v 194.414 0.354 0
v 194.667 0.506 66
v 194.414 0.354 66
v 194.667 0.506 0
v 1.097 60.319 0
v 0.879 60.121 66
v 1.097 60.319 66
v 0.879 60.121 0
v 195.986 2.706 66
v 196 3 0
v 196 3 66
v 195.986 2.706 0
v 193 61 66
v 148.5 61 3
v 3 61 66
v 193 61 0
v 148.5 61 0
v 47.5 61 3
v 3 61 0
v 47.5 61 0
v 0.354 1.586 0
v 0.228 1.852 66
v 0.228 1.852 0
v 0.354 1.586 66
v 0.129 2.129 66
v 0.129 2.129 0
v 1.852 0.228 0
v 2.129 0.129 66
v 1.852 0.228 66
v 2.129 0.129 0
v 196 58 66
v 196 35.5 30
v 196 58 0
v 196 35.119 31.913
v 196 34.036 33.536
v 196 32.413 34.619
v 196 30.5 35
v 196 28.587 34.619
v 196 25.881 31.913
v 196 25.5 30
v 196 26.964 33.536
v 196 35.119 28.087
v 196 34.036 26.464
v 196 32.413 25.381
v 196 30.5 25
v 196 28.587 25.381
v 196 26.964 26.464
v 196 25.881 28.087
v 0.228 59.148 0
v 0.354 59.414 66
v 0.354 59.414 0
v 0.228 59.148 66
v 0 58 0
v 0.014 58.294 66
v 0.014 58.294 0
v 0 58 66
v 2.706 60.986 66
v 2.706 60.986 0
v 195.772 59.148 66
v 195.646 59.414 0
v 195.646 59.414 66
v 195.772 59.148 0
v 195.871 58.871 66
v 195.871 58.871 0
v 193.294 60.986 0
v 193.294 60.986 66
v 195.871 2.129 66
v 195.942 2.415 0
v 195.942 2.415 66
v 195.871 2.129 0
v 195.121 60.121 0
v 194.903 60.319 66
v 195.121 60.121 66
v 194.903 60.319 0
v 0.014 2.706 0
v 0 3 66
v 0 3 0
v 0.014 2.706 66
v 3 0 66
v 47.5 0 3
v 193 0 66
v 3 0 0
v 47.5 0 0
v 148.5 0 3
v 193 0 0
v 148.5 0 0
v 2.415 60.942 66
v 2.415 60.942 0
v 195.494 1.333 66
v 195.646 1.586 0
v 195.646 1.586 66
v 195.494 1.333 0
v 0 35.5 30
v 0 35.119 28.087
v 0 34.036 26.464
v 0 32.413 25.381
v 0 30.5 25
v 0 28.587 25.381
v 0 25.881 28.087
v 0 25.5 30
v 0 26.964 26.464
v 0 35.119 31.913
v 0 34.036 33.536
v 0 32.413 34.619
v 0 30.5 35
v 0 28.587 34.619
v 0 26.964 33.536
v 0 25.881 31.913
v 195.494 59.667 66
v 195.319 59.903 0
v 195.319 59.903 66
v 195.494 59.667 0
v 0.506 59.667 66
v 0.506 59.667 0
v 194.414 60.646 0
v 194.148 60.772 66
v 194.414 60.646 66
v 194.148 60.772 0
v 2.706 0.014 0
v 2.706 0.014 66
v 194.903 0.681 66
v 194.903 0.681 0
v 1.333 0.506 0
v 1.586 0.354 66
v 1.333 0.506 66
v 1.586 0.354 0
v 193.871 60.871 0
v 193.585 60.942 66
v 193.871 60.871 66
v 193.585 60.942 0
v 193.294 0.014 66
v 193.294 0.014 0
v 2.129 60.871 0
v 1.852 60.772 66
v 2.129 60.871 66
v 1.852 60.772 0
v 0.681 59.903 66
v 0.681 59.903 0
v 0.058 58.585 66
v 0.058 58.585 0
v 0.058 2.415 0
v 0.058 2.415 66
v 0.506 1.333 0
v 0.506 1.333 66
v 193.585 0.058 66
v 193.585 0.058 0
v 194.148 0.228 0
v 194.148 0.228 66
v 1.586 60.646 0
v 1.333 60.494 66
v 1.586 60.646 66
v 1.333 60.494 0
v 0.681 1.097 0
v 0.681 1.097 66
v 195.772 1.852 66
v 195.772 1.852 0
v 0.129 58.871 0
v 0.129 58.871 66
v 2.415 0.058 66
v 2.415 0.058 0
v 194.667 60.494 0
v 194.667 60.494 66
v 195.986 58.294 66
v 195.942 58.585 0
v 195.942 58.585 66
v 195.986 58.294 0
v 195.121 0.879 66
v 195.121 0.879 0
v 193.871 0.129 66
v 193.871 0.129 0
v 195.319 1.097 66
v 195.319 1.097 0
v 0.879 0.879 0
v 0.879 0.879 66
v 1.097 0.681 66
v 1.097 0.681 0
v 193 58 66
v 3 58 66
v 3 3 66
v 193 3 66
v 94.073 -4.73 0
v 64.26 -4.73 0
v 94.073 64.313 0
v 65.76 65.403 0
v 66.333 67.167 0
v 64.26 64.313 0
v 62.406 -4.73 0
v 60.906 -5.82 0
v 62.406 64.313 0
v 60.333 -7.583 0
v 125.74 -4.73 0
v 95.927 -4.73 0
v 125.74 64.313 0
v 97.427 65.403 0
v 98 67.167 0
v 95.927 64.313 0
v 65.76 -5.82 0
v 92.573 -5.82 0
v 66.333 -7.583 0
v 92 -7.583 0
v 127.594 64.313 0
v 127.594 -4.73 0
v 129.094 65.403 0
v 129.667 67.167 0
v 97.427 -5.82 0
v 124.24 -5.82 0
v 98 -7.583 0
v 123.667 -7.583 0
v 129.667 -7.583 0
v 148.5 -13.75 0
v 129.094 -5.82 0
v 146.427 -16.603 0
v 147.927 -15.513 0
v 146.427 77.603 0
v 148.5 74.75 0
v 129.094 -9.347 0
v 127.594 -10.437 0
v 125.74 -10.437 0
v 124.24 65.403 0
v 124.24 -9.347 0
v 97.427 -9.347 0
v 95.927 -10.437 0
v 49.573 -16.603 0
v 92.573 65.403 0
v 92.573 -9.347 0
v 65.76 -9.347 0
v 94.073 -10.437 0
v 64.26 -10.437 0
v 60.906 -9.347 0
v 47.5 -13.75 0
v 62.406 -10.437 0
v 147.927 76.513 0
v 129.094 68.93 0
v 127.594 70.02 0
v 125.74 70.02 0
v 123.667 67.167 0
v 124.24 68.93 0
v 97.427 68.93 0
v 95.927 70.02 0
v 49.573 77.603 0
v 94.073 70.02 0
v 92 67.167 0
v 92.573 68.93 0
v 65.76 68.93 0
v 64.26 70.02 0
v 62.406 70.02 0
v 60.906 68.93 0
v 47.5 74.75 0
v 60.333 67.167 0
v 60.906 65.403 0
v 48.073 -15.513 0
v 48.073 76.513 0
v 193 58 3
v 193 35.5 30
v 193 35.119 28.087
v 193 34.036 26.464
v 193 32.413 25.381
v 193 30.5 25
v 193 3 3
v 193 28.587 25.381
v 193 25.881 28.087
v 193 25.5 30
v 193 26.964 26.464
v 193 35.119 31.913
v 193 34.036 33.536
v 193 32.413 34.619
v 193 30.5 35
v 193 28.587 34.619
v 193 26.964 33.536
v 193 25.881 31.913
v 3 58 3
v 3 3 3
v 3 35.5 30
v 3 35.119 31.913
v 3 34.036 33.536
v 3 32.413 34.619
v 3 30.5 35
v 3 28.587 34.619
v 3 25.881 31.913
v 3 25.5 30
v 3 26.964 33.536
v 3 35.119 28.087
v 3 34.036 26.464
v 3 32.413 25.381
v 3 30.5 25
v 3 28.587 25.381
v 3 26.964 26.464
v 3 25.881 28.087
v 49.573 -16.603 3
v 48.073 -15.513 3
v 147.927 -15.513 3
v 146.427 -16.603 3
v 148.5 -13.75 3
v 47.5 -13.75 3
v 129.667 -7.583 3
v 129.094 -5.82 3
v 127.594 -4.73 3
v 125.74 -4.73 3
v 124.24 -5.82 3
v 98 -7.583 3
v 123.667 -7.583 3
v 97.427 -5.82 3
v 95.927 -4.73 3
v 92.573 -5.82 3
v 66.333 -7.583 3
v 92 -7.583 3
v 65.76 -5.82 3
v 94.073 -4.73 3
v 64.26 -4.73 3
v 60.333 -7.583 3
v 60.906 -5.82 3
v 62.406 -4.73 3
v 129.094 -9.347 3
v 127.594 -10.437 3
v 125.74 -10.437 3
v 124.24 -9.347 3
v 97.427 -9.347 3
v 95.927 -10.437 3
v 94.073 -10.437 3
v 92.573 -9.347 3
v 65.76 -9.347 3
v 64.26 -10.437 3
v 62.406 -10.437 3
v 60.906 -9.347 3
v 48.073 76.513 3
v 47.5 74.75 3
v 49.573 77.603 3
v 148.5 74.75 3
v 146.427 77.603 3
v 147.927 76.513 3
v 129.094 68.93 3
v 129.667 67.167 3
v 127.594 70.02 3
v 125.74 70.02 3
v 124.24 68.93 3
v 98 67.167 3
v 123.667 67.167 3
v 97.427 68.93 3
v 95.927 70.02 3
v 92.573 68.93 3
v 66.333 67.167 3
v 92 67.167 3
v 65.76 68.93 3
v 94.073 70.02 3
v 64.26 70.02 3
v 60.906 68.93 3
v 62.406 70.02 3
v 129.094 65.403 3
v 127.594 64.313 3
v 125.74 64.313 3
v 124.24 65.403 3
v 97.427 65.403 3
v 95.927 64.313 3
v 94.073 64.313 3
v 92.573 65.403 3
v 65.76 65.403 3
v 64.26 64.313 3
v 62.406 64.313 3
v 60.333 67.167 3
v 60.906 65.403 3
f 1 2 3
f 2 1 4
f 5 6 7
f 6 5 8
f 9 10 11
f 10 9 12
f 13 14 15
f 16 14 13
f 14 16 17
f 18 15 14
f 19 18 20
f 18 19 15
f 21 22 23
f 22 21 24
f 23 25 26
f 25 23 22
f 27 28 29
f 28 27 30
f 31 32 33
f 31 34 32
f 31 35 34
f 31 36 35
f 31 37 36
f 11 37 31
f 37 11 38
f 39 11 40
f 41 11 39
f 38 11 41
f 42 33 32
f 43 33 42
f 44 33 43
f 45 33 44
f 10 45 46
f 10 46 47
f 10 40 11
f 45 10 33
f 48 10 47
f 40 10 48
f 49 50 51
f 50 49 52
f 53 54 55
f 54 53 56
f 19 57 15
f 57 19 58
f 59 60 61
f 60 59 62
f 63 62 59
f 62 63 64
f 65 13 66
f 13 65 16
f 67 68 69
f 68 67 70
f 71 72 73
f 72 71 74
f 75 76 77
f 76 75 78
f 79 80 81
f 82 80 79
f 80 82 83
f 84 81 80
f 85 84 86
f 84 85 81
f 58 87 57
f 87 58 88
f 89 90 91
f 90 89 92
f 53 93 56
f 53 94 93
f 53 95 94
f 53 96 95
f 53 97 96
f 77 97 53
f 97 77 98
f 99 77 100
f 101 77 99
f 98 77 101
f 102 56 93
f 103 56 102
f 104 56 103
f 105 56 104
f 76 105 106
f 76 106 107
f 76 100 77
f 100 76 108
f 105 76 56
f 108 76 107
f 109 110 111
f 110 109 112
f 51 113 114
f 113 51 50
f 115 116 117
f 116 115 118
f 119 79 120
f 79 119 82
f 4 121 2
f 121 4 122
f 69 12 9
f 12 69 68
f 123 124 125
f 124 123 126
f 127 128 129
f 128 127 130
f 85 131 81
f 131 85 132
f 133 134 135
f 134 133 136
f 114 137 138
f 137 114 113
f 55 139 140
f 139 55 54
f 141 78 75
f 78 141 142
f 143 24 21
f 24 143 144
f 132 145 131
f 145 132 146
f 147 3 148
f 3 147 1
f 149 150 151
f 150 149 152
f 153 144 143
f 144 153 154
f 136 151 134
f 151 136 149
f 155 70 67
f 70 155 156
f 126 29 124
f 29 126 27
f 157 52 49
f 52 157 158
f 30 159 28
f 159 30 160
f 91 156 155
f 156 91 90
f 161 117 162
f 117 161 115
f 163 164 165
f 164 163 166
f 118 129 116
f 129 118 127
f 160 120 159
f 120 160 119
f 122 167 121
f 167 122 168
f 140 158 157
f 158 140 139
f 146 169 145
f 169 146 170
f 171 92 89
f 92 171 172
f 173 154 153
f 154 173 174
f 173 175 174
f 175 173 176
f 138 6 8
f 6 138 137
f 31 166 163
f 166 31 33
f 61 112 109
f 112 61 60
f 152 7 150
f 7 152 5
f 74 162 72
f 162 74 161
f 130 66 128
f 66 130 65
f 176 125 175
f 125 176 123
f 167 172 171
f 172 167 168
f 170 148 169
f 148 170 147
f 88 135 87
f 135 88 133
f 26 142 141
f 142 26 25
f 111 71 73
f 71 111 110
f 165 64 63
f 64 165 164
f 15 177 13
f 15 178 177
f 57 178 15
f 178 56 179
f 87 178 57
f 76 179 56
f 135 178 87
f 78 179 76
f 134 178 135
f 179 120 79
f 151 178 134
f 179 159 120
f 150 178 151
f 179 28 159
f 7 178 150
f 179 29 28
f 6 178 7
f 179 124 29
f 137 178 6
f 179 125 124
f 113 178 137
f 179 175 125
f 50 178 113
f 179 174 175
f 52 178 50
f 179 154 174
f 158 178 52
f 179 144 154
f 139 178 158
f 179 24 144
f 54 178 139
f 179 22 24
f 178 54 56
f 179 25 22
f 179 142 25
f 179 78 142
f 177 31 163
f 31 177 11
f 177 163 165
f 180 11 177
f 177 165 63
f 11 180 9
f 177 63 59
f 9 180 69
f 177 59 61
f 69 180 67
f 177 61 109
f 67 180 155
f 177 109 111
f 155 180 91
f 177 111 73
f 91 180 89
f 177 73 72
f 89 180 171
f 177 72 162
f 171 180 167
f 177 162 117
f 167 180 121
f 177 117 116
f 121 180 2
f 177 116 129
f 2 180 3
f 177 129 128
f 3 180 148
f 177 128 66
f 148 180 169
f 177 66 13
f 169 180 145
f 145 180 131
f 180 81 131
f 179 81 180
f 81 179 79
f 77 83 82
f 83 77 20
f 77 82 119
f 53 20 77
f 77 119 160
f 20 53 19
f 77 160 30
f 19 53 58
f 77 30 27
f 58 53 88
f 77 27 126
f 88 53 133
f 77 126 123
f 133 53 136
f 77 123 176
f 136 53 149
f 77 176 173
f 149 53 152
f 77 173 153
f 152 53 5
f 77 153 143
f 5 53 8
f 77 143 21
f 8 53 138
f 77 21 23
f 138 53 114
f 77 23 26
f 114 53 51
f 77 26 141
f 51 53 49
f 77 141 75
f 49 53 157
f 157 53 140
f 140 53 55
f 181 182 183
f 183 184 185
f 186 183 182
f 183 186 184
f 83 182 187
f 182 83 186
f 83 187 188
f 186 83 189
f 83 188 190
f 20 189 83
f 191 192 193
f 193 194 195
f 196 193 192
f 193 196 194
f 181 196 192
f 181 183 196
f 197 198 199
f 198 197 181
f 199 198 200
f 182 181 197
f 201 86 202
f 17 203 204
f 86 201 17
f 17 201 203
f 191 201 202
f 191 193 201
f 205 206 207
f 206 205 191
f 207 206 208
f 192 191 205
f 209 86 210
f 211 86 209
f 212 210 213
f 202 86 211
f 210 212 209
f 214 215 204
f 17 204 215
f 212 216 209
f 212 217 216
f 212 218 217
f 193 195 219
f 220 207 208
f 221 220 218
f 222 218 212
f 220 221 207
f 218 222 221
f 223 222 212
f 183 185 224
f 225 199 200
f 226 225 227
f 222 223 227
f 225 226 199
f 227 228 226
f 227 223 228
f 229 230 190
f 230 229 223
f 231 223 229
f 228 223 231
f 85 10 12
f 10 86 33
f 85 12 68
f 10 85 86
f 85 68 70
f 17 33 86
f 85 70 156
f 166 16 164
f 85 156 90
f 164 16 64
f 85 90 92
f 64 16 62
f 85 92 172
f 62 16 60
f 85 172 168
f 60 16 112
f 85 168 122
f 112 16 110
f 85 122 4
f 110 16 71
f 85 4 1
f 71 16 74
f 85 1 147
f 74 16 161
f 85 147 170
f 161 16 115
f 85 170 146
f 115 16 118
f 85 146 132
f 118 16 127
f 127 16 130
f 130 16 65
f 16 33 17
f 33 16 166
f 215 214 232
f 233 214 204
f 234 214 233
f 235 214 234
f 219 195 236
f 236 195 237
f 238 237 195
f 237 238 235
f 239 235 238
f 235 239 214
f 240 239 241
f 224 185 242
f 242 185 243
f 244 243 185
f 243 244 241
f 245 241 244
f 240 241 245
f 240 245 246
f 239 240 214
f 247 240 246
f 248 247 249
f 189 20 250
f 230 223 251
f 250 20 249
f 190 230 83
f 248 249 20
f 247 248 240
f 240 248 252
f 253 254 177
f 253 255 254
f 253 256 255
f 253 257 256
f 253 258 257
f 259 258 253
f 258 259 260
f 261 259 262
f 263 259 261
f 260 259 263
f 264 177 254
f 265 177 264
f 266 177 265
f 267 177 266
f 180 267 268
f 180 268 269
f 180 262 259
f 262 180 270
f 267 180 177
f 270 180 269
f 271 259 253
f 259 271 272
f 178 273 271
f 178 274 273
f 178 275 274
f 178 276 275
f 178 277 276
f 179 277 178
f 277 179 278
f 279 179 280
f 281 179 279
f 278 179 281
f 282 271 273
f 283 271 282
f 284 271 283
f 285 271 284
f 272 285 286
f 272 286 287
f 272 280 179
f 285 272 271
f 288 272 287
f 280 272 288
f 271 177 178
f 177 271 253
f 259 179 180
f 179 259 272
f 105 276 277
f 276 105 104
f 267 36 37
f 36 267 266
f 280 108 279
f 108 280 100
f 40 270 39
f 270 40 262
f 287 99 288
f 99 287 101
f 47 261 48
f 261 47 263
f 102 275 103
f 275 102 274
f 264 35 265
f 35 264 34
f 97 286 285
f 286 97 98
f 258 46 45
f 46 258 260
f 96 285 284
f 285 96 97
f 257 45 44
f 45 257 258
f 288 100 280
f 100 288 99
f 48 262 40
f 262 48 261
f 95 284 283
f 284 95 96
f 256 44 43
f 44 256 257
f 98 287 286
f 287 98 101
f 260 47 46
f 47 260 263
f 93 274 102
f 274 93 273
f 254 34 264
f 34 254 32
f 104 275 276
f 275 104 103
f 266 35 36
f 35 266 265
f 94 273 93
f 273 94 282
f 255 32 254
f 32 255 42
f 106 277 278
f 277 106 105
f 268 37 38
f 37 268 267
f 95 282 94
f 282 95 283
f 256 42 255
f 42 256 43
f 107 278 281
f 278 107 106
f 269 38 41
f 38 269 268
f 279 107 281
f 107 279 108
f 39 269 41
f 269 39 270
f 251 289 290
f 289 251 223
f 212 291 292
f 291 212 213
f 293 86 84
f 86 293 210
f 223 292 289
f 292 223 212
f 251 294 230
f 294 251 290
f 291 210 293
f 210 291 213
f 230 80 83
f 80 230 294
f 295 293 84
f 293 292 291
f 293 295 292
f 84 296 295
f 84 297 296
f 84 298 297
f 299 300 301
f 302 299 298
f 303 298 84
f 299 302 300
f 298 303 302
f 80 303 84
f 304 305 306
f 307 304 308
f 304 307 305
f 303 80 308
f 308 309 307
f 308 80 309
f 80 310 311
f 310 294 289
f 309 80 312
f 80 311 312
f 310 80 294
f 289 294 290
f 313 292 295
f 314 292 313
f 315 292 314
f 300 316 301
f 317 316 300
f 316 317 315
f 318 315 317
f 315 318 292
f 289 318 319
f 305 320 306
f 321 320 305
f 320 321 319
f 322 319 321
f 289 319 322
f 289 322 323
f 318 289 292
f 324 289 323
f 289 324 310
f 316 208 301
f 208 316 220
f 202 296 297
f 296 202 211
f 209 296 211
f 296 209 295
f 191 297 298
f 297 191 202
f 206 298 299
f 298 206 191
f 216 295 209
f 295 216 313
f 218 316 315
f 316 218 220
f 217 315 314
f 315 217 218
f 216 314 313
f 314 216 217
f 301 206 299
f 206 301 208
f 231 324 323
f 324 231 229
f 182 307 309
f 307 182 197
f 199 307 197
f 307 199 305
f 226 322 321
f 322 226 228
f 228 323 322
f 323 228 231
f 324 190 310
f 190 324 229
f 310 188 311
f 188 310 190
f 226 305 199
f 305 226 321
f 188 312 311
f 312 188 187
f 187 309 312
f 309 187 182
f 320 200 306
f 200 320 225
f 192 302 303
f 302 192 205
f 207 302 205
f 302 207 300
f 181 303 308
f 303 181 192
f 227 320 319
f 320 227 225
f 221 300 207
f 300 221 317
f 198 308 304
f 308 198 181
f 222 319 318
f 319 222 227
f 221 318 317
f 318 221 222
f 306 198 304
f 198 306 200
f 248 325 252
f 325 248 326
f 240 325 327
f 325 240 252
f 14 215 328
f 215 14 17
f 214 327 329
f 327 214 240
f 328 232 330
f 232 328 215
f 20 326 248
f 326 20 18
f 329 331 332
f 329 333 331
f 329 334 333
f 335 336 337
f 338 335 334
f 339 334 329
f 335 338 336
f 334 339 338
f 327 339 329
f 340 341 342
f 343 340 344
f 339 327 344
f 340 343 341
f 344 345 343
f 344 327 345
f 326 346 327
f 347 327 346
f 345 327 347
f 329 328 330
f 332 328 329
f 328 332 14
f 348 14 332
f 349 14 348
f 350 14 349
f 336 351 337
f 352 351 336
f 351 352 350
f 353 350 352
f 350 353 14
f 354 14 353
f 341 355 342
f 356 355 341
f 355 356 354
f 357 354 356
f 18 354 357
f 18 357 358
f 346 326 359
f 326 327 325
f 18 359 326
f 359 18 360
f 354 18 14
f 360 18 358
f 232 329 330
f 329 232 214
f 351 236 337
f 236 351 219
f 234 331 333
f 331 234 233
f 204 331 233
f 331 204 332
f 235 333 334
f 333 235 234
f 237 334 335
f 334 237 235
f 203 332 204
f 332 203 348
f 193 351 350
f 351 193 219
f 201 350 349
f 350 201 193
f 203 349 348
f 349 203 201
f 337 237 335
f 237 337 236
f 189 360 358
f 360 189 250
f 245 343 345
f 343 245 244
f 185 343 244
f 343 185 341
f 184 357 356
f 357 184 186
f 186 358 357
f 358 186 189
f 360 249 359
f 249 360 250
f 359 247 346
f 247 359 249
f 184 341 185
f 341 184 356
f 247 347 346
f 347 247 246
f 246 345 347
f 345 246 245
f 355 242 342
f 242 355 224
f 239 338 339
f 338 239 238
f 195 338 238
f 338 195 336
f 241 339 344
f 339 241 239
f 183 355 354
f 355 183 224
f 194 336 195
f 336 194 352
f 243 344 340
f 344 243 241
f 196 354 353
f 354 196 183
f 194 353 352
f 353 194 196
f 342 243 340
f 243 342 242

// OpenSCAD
module box(width, height, depth, wall){
    
    difference(){
        translate([wall,wall,0])
        minkowski(){
           cube([width, depth, height]);
           cylinder(r=wall, h=2*wall, $fn=64);
        }
        translate([wall, wall, wall])
        cube([width, depth, 2 * height]);
        
        
        rotate([0,90,0])
        translate([-height/2,depth/2+ wall,-width/2])
        cylinder(r=5, h=2*width);
        
    }
    
    translate([width/2, - depth/4 - wall,0])
    difference(){
        linear_extrude(wall)
        minkowski(){
            translate([wall - width/4, wall,0])
            square([width/2, depth/4]);
            circle(r=wall);
        }
        translate([width/6,depth/6,0])
        cylinder(r=3, h= 5*wall, center=true);
        translate([-width/6,depth/6,0])
        cylinder(r=3, h= 5*wall, center=true);
        translate([0,depth/6,0])
        cylinder(r=3, h= 5*wall, center=true);
    }
    
    translate([width/2, depth + wall,0])
    difference(){
        linear_extrude(wall)
        minkowski(){
            translate([wall - width/4, wall,0])
            square([width/2, depth/4]);
            circle(r=wall);
        }
        
        translate([width/6,depth/6,0])
        cylinder(r=3, h= 5*wall, center=true);
        translate([-width/6,depth/6,0])
        cylinder(r=3, h= 5*wall, center=true);
        translate([0,depth/6,0])
        cylinder(r=3, h= 5*wall, center=true);
    }
    
}

module deckel(width, height, depth, wall){
    
    difference(){
        union(){
            translate([wall,wall,0])
            linear_extrude(height)
            minkowski(){
               square([width, depth]);
               circle(r=wall, $fn=64);
            }
            translate([wall, wall, -wall])
            cube([width, depth, 2 * height]);
        }
        translate([width/2, depth/2,wall /2])
        linear_extrude(4*wall)
        text("LED", size=32, halign="center", valign="center");
    }
    
    
}

box(
    width=190,
    height=60,
    depth=55,
    wall=3
);

translate([0,0,80])
%deckel(
    width=190,
    height=3,
    depth=55,
    wall=3
);
